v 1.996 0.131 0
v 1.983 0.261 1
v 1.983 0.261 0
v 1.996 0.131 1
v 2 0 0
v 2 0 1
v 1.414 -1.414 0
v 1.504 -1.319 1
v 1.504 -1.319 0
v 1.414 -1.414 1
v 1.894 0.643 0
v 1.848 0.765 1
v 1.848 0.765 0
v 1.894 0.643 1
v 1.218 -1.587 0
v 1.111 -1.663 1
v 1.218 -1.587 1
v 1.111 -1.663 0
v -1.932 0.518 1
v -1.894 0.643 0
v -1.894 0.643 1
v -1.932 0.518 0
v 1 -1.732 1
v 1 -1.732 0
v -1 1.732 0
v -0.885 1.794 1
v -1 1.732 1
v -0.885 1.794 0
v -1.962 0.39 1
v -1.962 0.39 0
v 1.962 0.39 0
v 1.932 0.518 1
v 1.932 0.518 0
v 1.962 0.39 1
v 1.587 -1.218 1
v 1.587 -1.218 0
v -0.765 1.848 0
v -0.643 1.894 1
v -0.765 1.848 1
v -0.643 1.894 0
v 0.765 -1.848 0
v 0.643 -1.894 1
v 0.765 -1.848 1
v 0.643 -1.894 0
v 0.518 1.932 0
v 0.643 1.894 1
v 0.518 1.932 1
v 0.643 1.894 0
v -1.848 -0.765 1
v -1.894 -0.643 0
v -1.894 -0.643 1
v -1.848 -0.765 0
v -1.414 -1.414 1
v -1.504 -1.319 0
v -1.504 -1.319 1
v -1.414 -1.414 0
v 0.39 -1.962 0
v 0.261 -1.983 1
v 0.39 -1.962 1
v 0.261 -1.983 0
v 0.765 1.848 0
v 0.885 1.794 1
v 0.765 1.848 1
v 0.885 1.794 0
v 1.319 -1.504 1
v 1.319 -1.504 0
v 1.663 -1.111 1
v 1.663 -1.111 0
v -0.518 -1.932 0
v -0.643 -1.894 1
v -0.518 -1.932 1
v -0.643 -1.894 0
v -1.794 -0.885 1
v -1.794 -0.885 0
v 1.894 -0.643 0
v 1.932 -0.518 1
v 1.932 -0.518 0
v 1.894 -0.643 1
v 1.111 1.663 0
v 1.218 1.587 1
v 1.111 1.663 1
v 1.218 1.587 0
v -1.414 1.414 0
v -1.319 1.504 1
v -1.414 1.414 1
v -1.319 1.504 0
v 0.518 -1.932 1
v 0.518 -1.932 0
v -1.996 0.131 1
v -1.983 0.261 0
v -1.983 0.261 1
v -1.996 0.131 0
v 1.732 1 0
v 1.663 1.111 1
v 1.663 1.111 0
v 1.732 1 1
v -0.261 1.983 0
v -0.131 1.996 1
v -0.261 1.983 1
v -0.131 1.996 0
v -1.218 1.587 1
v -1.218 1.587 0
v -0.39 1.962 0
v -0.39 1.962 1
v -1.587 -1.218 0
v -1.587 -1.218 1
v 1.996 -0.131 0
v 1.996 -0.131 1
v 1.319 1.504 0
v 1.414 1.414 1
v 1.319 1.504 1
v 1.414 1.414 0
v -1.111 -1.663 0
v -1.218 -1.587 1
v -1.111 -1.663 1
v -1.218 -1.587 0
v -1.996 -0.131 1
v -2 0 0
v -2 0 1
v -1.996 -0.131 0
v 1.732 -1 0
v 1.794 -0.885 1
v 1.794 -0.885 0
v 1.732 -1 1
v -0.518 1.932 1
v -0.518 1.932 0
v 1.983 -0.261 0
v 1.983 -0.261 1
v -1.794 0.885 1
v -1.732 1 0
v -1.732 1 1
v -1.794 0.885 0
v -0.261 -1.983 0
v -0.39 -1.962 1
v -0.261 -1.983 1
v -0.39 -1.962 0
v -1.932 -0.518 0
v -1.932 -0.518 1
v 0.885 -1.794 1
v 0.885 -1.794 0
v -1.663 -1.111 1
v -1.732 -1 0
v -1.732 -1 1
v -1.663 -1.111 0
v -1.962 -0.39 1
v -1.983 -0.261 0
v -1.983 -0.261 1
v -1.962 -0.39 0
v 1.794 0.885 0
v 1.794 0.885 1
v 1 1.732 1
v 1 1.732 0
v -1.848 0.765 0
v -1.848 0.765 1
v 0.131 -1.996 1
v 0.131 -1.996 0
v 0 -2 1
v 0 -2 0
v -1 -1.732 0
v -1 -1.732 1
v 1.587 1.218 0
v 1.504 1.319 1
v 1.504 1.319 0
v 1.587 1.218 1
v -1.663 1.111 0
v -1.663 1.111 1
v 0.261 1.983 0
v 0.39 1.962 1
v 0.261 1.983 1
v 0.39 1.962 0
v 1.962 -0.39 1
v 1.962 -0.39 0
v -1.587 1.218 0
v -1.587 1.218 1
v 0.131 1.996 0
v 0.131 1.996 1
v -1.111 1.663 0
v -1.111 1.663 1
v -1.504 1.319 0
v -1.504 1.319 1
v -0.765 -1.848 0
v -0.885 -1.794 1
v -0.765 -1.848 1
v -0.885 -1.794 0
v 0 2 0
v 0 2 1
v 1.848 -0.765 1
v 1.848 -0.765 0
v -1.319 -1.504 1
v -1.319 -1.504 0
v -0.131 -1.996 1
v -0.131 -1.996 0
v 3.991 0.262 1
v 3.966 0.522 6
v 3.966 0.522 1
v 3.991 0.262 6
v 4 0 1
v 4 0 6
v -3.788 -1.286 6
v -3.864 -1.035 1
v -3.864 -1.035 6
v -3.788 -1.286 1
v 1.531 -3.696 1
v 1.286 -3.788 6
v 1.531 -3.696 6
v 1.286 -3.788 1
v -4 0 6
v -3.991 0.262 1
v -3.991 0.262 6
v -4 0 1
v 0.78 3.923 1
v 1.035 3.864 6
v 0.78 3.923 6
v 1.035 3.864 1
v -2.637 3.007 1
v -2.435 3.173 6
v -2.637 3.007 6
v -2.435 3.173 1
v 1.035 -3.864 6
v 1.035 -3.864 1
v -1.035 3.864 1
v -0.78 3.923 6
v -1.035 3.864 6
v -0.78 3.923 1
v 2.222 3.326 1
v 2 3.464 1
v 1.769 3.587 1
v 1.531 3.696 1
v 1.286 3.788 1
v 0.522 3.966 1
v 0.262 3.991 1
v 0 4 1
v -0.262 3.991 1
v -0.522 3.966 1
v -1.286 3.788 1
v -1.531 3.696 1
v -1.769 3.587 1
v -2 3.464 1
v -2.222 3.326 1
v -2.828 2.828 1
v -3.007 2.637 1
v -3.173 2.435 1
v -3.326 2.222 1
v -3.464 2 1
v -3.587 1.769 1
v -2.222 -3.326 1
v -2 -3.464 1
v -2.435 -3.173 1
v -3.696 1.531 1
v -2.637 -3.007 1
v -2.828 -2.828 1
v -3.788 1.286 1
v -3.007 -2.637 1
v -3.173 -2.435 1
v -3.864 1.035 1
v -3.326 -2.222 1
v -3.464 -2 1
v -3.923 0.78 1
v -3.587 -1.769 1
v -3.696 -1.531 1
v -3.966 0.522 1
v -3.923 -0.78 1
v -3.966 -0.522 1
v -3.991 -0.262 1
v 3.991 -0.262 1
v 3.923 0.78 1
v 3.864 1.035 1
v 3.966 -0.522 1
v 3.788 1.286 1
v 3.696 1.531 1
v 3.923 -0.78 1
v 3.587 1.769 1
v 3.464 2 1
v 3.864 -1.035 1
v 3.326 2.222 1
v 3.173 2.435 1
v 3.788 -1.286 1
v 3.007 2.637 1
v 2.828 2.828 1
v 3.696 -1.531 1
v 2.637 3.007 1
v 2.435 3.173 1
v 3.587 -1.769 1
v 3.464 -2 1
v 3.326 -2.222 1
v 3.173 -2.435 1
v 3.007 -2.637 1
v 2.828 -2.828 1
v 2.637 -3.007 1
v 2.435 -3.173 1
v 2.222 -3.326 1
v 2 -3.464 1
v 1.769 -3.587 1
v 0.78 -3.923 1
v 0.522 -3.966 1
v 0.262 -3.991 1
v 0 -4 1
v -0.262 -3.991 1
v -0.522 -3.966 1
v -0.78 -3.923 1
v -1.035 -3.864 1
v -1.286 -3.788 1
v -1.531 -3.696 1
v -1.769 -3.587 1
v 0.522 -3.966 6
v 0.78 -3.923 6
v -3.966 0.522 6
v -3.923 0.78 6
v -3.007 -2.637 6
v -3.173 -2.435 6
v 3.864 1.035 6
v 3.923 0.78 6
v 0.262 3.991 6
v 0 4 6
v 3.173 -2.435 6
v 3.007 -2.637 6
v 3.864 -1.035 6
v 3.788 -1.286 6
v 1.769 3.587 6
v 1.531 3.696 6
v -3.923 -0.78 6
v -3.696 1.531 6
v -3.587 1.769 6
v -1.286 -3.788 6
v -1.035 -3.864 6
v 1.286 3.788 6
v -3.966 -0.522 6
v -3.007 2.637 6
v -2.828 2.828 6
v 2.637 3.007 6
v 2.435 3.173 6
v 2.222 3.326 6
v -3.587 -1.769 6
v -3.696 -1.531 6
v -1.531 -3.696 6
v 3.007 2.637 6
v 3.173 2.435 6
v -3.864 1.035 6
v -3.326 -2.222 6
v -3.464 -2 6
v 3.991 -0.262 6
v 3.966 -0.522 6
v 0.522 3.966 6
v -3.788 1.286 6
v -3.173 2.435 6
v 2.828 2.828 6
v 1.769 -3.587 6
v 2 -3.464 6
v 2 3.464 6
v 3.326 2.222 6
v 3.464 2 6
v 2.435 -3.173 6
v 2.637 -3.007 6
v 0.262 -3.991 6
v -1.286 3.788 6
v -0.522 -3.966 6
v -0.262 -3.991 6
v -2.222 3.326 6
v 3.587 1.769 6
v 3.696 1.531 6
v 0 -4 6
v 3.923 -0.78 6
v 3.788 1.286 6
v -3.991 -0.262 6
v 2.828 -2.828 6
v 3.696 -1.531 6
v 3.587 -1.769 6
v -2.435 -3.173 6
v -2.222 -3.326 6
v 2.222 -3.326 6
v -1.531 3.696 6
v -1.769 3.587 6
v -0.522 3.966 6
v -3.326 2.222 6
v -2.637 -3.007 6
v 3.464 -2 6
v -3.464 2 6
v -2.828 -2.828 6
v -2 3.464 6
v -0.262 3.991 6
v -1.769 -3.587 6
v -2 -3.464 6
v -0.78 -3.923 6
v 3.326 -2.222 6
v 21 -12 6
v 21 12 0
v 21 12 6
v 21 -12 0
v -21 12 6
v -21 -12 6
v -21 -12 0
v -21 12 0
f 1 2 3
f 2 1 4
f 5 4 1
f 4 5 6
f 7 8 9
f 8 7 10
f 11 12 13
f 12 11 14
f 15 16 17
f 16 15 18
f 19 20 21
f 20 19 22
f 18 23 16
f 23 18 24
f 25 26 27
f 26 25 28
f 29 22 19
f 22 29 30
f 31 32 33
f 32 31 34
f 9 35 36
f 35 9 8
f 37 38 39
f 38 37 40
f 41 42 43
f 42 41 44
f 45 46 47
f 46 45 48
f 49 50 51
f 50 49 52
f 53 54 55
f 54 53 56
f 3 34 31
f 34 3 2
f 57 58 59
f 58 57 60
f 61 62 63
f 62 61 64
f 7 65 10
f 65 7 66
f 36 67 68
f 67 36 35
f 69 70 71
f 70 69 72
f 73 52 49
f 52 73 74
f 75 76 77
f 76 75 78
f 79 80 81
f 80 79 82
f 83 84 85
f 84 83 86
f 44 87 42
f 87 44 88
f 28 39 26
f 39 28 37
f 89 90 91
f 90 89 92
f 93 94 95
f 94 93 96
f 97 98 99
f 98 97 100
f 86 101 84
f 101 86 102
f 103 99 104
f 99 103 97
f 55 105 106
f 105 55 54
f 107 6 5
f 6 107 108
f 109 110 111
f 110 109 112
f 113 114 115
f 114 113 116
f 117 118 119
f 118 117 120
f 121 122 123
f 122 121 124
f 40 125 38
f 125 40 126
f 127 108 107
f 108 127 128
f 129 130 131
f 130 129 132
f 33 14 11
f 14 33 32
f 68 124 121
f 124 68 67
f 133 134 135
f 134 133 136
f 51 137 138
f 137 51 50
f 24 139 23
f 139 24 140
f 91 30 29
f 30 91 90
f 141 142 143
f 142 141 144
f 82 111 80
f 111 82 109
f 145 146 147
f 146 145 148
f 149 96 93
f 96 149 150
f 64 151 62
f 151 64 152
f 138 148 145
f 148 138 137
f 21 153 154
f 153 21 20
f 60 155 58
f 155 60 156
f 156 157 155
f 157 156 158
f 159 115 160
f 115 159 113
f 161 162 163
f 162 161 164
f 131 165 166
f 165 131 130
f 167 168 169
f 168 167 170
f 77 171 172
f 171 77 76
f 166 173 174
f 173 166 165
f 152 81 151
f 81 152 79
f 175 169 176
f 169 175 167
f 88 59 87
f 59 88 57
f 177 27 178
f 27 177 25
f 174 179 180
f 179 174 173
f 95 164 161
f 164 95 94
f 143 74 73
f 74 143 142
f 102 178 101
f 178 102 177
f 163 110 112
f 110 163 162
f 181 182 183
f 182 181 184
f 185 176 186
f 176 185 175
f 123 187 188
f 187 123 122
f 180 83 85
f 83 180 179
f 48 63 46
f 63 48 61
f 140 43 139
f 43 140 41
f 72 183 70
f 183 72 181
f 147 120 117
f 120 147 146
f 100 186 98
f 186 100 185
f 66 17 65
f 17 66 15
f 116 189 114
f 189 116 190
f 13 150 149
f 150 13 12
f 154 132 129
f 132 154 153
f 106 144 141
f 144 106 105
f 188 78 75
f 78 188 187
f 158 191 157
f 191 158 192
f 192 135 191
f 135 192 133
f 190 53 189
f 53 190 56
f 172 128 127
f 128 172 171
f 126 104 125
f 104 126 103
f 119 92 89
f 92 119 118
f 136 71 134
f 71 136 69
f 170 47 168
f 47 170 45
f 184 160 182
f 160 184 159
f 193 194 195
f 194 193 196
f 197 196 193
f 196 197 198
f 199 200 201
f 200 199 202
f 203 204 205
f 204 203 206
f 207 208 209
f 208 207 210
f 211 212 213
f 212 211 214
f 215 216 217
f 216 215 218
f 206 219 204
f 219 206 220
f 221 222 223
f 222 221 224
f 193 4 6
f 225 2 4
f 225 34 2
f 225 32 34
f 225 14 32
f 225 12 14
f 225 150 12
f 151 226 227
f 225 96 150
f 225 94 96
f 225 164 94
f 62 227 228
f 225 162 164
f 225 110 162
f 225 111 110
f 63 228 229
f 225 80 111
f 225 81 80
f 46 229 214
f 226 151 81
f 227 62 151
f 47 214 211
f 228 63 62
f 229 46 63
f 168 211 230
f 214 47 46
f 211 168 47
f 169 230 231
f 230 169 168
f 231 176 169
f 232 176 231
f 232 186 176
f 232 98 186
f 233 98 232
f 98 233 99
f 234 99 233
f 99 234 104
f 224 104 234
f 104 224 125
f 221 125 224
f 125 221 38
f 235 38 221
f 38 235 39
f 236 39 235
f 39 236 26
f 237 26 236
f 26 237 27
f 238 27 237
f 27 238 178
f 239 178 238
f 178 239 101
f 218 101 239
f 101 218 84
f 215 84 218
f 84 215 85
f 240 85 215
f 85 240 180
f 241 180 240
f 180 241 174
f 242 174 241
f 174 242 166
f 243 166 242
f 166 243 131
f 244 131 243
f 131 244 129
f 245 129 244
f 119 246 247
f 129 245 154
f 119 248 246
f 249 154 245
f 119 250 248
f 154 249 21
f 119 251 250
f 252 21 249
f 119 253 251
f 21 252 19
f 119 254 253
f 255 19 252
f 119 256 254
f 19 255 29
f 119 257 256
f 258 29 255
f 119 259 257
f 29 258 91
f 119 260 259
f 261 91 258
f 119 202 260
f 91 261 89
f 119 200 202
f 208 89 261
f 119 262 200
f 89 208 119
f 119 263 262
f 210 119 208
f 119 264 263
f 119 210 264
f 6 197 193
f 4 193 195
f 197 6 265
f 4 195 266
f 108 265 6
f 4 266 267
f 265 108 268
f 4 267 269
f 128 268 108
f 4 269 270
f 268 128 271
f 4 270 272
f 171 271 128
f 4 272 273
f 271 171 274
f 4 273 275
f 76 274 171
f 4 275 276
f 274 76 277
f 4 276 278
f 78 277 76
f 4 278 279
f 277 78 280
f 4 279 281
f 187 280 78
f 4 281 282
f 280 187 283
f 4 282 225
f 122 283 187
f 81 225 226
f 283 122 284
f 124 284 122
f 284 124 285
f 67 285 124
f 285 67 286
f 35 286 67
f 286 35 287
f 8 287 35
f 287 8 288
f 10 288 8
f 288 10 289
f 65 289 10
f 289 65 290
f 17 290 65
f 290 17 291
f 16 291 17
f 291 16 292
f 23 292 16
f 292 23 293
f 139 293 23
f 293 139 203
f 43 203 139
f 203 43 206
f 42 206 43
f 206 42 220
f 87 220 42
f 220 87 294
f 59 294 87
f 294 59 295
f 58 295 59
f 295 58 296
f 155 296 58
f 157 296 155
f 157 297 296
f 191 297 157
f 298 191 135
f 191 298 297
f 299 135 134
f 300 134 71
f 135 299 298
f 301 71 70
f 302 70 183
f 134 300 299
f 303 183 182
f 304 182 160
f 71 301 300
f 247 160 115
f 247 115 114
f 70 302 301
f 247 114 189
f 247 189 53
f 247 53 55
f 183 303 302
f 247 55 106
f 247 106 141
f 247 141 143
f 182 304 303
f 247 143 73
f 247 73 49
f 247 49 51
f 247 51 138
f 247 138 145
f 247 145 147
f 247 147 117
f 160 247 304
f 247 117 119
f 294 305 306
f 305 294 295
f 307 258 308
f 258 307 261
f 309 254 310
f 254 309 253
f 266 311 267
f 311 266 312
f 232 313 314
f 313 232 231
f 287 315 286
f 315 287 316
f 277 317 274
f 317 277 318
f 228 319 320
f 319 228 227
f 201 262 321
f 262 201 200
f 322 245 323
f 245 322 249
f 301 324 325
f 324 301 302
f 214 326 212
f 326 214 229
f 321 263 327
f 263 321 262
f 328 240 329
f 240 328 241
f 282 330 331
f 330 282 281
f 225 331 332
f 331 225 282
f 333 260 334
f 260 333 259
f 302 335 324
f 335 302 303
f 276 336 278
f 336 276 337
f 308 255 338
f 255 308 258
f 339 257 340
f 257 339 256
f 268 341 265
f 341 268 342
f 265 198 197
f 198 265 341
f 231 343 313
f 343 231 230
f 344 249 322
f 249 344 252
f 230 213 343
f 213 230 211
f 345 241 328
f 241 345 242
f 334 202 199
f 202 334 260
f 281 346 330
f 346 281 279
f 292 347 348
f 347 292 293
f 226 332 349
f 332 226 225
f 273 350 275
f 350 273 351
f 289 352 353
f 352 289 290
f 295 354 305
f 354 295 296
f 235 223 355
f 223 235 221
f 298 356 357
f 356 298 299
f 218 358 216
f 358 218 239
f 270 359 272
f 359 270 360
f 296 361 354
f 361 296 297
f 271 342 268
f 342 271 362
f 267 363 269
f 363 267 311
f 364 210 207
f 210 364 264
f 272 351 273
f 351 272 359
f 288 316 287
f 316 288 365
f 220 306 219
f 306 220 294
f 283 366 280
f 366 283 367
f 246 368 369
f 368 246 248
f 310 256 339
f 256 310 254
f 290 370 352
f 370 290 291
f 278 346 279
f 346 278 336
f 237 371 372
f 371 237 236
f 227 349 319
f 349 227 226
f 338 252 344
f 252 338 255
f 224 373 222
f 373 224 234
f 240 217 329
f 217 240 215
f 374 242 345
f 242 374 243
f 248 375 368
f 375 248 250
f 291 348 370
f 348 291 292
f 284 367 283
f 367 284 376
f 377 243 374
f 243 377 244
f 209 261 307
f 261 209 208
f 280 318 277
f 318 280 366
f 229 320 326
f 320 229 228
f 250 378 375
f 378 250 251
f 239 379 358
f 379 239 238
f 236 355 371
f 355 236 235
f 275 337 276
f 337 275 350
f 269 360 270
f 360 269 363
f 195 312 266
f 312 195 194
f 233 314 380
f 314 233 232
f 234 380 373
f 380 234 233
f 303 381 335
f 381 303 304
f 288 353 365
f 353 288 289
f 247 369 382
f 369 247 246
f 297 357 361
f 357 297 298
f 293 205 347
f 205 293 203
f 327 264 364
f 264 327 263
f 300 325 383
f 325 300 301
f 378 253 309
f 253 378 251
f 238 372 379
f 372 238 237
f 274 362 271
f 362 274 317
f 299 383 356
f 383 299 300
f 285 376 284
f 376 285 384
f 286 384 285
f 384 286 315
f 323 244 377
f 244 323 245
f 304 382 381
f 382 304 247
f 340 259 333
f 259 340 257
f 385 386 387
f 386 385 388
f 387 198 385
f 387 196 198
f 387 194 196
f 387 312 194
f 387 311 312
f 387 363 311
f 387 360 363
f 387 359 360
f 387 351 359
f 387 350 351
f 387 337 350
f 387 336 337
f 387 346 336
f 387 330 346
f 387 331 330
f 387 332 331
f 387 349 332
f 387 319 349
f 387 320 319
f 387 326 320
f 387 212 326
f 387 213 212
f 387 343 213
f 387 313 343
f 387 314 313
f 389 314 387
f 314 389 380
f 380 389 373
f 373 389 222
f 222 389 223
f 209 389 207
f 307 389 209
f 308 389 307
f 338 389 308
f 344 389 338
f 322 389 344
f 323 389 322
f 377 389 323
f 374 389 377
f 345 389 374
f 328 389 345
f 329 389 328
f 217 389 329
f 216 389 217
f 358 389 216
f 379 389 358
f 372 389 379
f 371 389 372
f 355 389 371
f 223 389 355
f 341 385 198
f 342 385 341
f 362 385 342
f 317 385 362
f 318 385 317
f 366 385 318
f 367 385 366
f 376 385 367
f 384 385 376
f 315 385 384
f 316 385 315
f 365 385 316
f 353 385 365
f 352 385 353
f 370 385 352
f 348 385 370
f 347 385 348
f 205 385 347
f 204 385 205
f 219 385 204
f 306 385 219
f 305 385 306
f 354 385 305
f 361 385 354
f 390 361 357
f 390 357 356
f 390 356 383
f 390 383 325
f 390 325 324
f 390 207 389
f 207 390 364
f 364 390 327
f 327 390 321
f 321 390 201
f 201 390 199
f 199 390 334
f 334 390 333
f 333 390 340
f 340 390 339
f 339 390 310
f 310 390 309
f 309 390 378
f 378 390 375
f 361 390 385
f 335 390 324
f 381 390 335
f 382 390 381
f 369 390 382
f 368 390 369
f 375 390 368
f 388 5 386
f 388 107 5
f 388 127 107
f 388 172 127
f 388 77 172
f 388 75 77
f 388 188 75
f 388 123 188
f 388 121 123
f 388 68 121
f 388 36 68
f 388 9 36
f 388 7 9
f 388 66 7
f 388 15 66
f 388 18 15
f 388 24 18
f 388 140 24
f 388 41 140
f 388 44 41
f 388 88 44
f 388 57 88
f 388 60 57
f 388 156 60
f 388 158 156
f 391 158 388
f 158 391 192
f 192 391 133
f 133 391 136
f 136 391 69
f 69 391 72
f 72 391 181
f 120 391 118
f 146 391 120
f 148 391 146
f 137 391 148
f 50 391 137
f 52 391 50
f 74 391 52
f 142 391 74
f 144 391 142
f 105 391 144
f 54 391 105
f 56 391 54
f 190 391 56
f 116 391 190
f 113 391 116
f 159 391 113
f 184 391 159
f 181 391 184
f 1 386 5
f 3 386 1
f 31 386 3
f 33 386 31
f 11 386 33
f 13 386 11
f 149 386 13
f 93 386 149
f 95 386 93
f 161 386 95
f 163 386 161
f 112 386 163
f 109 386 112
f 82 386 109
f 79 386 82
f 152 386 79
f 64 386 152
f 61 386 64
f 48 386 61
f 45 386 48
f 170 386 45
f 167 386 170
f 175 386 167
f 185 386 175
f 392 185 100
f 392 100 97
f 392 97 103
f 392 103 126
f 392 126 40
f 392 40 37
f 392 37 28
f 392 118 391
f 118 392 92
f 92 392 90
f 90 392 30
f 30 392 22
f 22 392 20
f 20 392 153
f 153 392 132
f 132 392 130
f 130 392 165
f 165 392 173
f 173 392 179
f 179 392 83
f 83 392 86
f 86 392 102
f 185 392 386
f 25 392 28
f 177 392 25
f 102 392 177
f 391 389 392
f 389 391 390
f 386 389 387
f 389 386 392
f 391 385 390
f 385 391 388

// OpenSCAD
// Auto-generated from tests/data/feature_fixtures_manifest.json
// fixture: plate_counterbore_depth_near_thickness
// fixture_type: plate
// description: Counterbore depth is close to plate thickness without becoming a blind through-profile.
$fn = 96;

plate_size = [42.000000, 24.000000, 6.000000];
plate_origin = [-21.000000, -12.000000, 0.000000];

module through_hole(center, diameter, height) {
  translate(center) cylinder(d=diameter, h=height, center=false);
}

module through_slot(start, end, width, height) {
  hull() {
    through_hole(start, width, height);
    through_hole(end, width, height);
  }
}

module counterbore_hole(center, through_d, bore_d, bore_depth, plate_thickness) {
  translate([center[0], center[1], -0.1])
    cylinder(d=through_d, h=plate_thickness + 0.2, center=false);
  translate([center[0], center[1], plate_thickness - bore_depth])
    cylinder(d=bore_d, h=bore_depth + 0.1, center=false);
}

difference() {
  translate(plate_origin) cube(plate_size);
  counterbore_hole([0.000000, 0.000000, 0.000000], 4.000000, 8.000000, 5.000000, 6.000000);  // counterbore_0
}
